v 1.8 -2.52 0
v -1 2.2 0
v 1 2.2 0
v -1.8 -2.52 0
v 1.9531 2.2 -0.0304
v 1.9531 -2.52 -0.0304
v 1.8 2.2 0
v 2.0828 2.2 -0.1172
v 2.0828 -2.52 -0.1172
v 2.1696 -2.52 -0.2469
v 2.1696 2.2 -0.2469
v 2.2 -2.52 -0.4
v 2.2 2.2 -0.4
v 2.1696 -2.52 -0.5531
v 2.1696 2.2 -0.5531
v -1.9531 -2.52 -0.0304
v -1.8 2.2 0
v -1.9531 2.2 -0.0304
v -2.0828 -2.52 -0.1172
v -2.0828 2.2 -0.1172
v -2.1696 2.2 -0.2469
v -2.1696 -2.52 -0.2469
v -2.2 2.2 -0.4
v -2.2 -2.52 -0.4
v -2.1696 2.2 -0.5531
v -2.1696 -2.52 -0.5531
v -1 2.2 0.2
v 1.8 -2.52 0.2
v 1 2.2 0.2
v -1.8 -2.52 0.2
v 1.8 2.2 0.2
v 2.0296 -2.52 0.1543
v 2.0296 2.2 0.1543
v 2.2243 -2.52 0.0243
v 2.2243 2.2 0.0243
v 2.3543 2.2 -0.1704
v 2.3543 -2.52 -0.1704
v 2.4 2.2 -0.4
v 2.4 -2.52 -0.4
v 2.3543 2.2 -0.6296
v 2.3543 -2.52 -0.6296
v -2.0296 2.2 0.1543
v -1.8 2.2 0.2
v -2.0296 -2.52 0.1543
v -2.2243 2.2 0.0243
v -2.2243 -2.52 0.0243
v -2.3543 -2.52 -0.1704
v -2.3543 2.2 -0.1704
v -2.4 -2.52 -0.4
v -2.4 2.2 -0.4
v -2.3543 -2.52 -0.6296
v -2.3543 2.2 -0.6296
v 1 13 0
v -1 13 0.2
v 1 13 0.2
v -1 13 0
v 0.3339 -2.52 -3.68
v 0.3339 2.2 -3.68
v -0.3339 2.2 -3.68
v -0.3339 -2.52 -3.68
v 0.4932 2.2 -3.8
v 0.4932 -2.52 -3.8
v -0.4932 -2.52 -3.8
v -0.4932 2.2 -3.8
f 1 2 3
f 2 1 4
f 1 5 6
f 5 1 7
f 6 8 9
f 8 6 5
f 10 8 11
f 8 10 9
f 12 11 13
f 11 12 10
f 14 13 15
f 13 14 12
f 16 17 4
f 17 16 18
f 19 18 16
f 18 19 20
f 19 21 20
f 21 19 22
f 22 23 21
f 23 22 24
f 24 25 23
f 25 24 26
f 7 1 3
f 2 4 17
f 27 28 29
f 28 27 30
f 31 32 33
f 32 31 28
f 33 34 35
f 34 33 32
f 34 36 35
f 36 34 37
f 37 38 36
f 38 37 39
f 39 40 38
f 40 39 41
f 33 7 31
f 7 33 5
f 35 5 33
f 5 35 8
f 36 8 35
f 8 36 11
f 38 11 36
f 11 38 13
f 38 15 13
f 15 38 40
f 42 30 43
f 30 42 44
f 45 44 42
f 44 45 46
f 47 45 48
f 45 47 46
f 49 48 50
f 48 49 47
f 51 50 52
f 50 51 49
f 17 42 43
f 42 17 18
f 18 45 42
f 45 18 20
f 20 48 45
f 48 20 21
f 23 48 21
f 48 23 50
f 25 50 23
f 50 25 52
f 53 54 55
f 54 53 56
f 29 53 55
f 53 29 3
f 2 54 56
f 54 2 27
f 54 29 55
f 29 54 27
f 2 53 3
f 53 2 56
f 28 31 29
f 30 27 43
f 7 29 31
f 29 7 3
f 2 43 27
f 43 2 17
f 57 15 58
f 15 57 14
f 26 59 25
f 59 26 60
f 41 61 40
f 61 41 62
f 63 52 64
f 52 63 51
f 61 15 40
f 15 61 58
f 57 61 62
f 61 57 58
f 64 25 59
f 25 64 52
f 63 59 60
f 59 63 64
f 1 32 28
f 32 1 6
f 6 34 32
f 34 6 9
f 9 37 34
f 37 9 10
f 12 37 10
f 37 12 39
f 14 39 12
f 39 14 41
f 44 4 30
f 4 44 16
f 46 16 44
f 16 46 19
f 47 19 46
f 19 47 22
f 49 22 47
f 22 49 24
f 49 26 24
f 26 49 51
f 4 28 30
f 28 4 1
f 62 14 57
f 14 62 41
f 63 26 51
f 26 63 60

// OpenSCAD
// file: ../p/box5-2p.scad
use <../lib.scad>
function ldraw_lib__box5_2p() = [
// 0 Box with  5 Faces without  2 Parallel Edges
// 0 Name: box5-2p.dat
// 0 Author: Willy Tschager [Holly-Wood]
// 0 !LDRAW_ORG Primitive UPDATE 2024-01
// 0 !LICENSE Licensed under CC BY 4.0 : see CAreadme.txt
// 
// 0 BFC CERTIFY CCW
  [0,"BFC","CERTIFY"],
  [0,"BFC","CCW"],
// 
// 0 !HISTORY 2012-03-30 [PTadmin] Official Update 2012-01
// 0 !HISTORY 2024-01-04 [Holly-Wood] Complete re-write, original by Brickaneer
// 0 !HISTORY 2024-01-29 [OrionP] Official Update 2024-01
// 
// 2 24 -1 1 1 1 1 1
  [2,24,-1,1,1,1,1,1],
// 2 24 -1 1 -1 -1 1 1
  [2,24,-1,1,-1,-1,1,1],
// 2 24 1 1 -1 -1 1 -1
  [2,24,1,1,-1,-1,1,-1],
// 2 24 1 1 1 1 1 -1
  [2,24,1,1,1,1,1,-1],
// 4 16 1 1 1 1 1 -1 -1 1 -1 -1 1 1
  [4,16,1,1,1,1,1,-1,-1,1,-1,-1,1,1],
// 
// 2 24 -1 1 1 -1 0 1
  [2,24,-1,1,1,-1,0,1],
// 2 24 -1 1 -1 -1 0 -1
  [2,24,-1,1,-1,-1,0,-1],
// 2 24 -1 0 -1 -1 0 1
  [2,24,-1,0,-1,-1,0,1],
// 4 16 -1 1 1 -1 1 -1 -1 0 -1 -1 0 1
  [4,16,-1,1,1,-1,1,-1,-1,0,-1,-1,0,1],
// 
// 2 24 1 1 1 1 0 1
  [2,24,1,1,1,1,0,1],
// 2 24 1 1 -1 1 0 -1
  [2,24,1,1,-1,1,0,-1],
// 2 24 1 0 1 1 0 -1
  [2,24,1,0,1,1,0,-1],
// 4 16 1 1 -1 1 1 1 1 0 1 1 0 -1
  [4,16,1,1,-1,1,1,1,1,0,1,1,0,-1],
// 
// 4 16 1 1 1 -1 1 1 -1 0 1 1 0 1
  [4,16,1,1,1,-1,1,1,-1,0,1,1,0,1],
// 4 16 -1 1 -1 1 1 -1 1 0 -1 -1 0 -1
  [4,16,-1,1,-1,1,1,-1,1,0,-1,-1,0,-1],
];
module ldraw_lib__box5_2p(step=0, col=false, unit=2/5, alt=false, line=0.2, solid=!$preview)
    makepoly(ldraw_lib__box5_2p(), step=step, col=col, unit=unit, alt=alt, line=line, solid=solid);
ldraw_lib__box5_2p(line=0.2);
// file: ../p/5-16cyli.scad
use <../lib.scad>
function ldraw_lib__5_16cyli() = [
// 0 Cylinder 0.3125
// 0 Name: 5-16cyli.dat
// 0 Author: Philippe Hurbain [Philo]
// 0 !LDRAW_ORG Primitive UPDATE 2009-03
// 0 !LICENSE Licensed under CC BY 4.0 : see CAreadme.txt
// 
// 0 BFC CERTIFY CCW
  [0,"BFC","CERTIFY"],
  [0,"BFC","CCW"],
// 
// 0 !HISTORY 2009-12-29 [PTadmin] Official Update 2009-03
// 
// 
// 4 16 0.9239 0 0.3827 1 0 0 1 1 0 0.9239 1 0.3827
  [4,16,0.9239,0,0.3827,1,0,0,1,1,0,0.9239,1,0.3827],
// 4 16 0.7071 0 0.7071 0.9239 0 0.3827 0.9239 1 0.3827 0.7071 1 0.7071
  [4,16,0.7071,0,0.7071,0.9239,0,0.3827,0.9239,1,0.3827,0.7071,1,0.7071],
// 4 16 0.3827 0 0.9239 0.7071 0 0.7071 0.7071 1 0.7071 0.3827 1 0.9239
  [4,16,0.3827,0,0.9239,0.7071,0,0.7071,0.7071,1,0.7071,0.3827,1,0.9239],
// 4 16 0 0 1 0.3827 0 0.9239 0.3827 1 0.9239 0 1 1
  [4,16,0,0,1,0.3827,0,0.9239,0.3827,1,0.9239,0,1,1],
// 4 16 -0.3827 0 0.9239 0 0 1 0 1 1 -0.3827 1 0.9239
  [4,16,-0.3827,0,0.9239,0,0,1,0,1,1,-0.3827,1,0.9239],
// 
// 0 // conditional lines
// 5 24 1 1 0 1 0 0 1 1 -0.4142 0.9239 1 0.3827
  [5,24,1,1,0,1,0,0,1,1,-0.4142,0.9239,1,0.3827],
// 5 24 0.9239 1 0.3827 0.9239 0 0.3827 1 1 0 0.7071 1 0.7071
  [5,24,0.9239,1,0.3827,0.9239,0,0.3827,1,1,0,0.7071,1,0.7071],
// 5 24 0.7071 1 0.7071 0.7071 0 0.7071 0.9239 1 0.3827 0.3827 1 0.9239
  [5,24,0.7071,1,0.7071,0.7071,0,0.7071,0.9239,1,0.3827,0.3827,1,0.9239],
// 5 24 0.3827 1 0.9239 0.3827 0 0.9239 0.7071 1 0.7071 0 1 1
  [5,24,0.3827,1,0.9239,0.3827,0,0.9239,0.7071,1,0.7071,0,1,1],
// 5 24 0 1 1 0 0 1 0.3827 1 0.9239 -0.3827 1 0.9239
  [5,24,0,1,1,0,0,1,0.3827,1,0.9239,-0.3827,1,0.9239],
// 5 24 -0.3827 1 0.9239 -0.3827 0 0.9239 0 1 1 -0.7654 1 0.7654
  [5,24,-0.3827,1,0.9239,-0.3827,0,0.9239,0,1,1,-0.7654,1,0.7654],
// 
// 0 // end of file
// 
];
module ldraw_lib__5_16cyli(step=0, col=false, unit=2/5, alt=false, line=0.2, solid=!$preview)
    makepoly(ldraw_lib__5_16cyli(), step=step, col=col, unit=unit, alt=alt, line=line, solid=solid);
ldraw_lib__5_16cyli(line=0.2);
// file: s/u9654s01.scad
use <../../lib.scad>
use <../../p/5-16cyli.scad>
use <../../p/5-16edge.scad>
use <../../p/5-16ring2.scad>
use <../../p/box5-2p.scad>
use <../../p/rect2p.scad>
function ldraw_lib__s__u9654s01() = [
// 0 ~Electric Switch: Plug Common Shape
// 0 Name: s\u9654s01.dat
// 0 Author: Javier Orquera [kuramapika1]
// 0 !LDRAW_ORG Subpart UPDATE 2026-07
// 0 !LICENSE Licensed under CC BY 4.0 : see CAreadme.txt
// 
// 0 BFC CERTIFY CCW
  [0,"BFC","CERTIFY"],
  [0,"BFC","CCW"],
// 
// 0 !HISTORY 2025-04-24 [kuramapika1] Changed some vertex positions to fit the shape of parent parts
// 0 !HISTORY 2026-07-30 [OrionP] Official Update 2026-07
// 
// 4 16 -2.5 0 5.5 2.5 0 5.5 4.5 0 -6.3 -4.5 0 -6.3
  [4,16,-2.5,0,5.5,2.5,0,5.5,4.5,0,-6.3,-4.5,0,-6.3],
// 0 BFC INVERTNEXT
  [0,"BFC","INVERTNEXT"],
// 1 16 4.5 1 -6.3 0 0 1 -1 0 0 0 11.8 0 5-16cyli.dat
  [1,16,4.5,1,-6.3,0,0,1,-1,0,0,0,11.8,0, ldraw_lib__5_16cyli()],
// 1 16 4.5 1 5.5 0 0 1 -1 0 0 0 1 0 5-16edge.dat
  [1,16,4.5,1,5.5,0,0,1,-1,0,0,0,1,0, ldraw_lib__5_16edge()],
// 0 BFC INVERTNEXT
  [0,"BFC","INVERTNEXT"],
// 1 16 -4.5 1 -6.3 0 0 -1 -1 0 0 0 11.8 0 5-16cyli.dat
  [1,16,-4.5,1,-6.3,0,0,-1,-1,0,0,0,11.8,0, ldraw_lib__5_16cyli()],
// 1 16 -4.5 1 5.5 0 0 -1 -1 0 0 0 1 0 5-16edge.dat
  [1,16,-4.5,1,5.5,0,0,-1,-1,0,0,0,1,0, ldraw_lib__5_16edge()],
// 3 16 4.5 0 5.5 4.5 0 -6.3 2.5 0 5.5
  [3,16,4.5,0,5.5,4.5,0,-6.3,2.5,0,5.5],
// 3 16 -2.5 0 5.5 -4.5 0 -6.3 -4.5 0 5.5
  [3,16,-2.5,0,5.5,-4.5,0,-6.3,-4.5,0,5.5],
// 4 16 2.5 -.5 5.5 -2.5 -.5 5.5 -4.5 -.5 -6.3 4.5 -.5 -6.3
  [4,16,2.5,-.5,5.5,-2.5,-.5,5.5,-4.5,-.5,-6.3,4.5,-.5,-6.3],
// 1 16 4.5 1 -6.3 0 0 1.5 -1.5 0 0 0 11.8 0 5-16cyli.dat
  [1,16,4.5,1,-6.3,0,0,1.5,-1.5,0,0,0,11.8,0, ldraw_lib__5_16cyli()],
// 1 16 4.5 1 5.5 0 0 1.5 -1.5 0 0 0 1 0 5-16edge.dat
  [1,16,4.5,1,5.5,0,0,1.5,-1.5,0,0,0,1,0, ldraw_lib__5_16edge()],
// 1 16 4.5 1 5.5 0 0 .5 -.5 0 0 0 -1 0 5-16ring2.dat
  [1,16,4.5,1,5.5,0,0,.5,-.5,0,0,0,-1,0, ldraw_lib__5_16ring2()],
// 1 16 -4.5 1 -6.3 0 0 -1.5 -1.5 0 0 0 11.8 0 5-16cyli.dat
  [1,16,-4.5,1,-6.3,0,0,-1.5,-1.5,0,0,0,11.8,0, ldraw_lib__5_16cyli()],
// 1 16 -4.5 1 5.5 0 0 -1.5 -1.5 0 0 0 1 0 5-16edge.dat
  [1,16,-4.5,1,5.5,0,0,-1.5,-1.5,0,0,0,1,0, ldraw_lib__5_16edge()],
// 1 16 -4.5 1 5.5 0 0 -.5 -.5 0 0 0 -1 0 5-16ring2.dat
  [1,16,-4.5,1,5.5,0,0,-.5,-.5,0,0,0,-1,0, ldraw_lib__5_16ring2()],
// 1 16 0 -0.25 5.5 -2.5 0 0 0 0 -0.25 0 27 0 box5-2p.dat
  [1,16,0,-0.25,5.5,-2.5,0,0,0,0,-0.25,0,27,0, ldraw_lib__box5_2p()],
// 3 16 4.5 -.5 -6.3 4.5 -.5 5.5 2.5 -.5 5.5
  [3,16,4.5,-.5,-6.3,4.5,-.5,5.5,2.5,-.5,5.5],
// 3 16 -4.5 -.5 -6.3 -2.5 -.5 5.5 -4.5 -.5 5.5
  [3,16,-4.5,-.5,-6.3,-2.5,-.5,5.5,-4.5,-.5,5.5],
// 1 16 3.5 -.25 5.5 -1 0 0 0 0 -.25 0 -1 0 rect2p.dat
  [1,16,3.5,-.25,5.5,-1,0,0,0,0,-.25,0,-1,0, ldraw_lib__rect2p()],
// 1 16 -3.5 -.25 5.5 -1 0 0 0 0 -.25 0 -1 0 rect2p.dat
  [1,16,-3.5,-.25,5.5,-1,0,0,0,0,-.25,0,-1,0, ldraw_lib__rect2p()],
// 4 16 .83485 9.2 -6.3 5.4239 1.3827 -6.3 5.4239 1.3827 5.5 .83485 9.2 5.5
  [4,16,.83485,9.2,-6.3,5.4239,1.3827,-6.3,5.4239,1.3827,5.5,.83485,9.2,5.5],
// 4 16 -.83485 9.2 5.5 -5.4239 1.3827 5.5 -5.4239 1.3827 -6.3 -.83485 9.2 -6.3
  [4,16,-.83485,9.2,5.5,-5.4239,1.3827,5.5,-5.4239,1.3827,-6.3,-.83485,9.2,-6.3],
// 4 16 5.88585 1.57405 5.5 5.88585 1.57405 -6.3 1.23302 9.5 -6.3 1.23302 9.5 5.5
  [4,16,5.88585,1.57405,5.5,5.88585,1.57405,-6.3,1.23302,9.5,-6.3,1.23302,9.5,5.5],
// 4 16 -5.88585 1.57405 -6.3 -5.88585 1.57405 5.5 -1.23302 9.5 5.5 -1.23302 9.5 -6.3
  [4,16,-5.88585,1.57405,-6.3,-5.88585,1.57405,5.5,-1.23302,9.5,5.5,-1.23302,9.5,-6.3],
// 4 16 5.4239 1.3827 5.5 5.88585 1.57405 5.5 1.23302 9.5 5.5 .83485 9.2 5.5
  [4,16,5.4239,1.3827,5.5,5.88585,1.57405,5.5,1.23302,9.5,5.5,.83485,9.2,5.5],
// 4 16 .83485 9.2 5.5 1.23302 9.5 5.5 1.23302 9.5 -6.3 .83485 9.2 -6.3
  [4,16,.83485,9.2,5.5,1.23302,9.5,5.5,1.23302,9.5,-6.3,.83485,9.2,-6.3],
// 4 16 -.83485 9.2 5.5 -1.23302 9.5 5.5 -5.88585 1.57405 5.5 -5.4239 1.3827 5.5
  [4,16,-.83485,9.2,5.5,-1.23302,9.5,5.5,-5.88585,1.57405,5.5,-5.4239,1.3827,5.5],
// 4 16 -.83485 9.2 -6.3 -1.23302 9.5 -6.3 -1.23302 9.5 5.5 -.83485 9.2 5.5
  [4,16,-.83485,9.2,-6.3,-1.23302,9.5,-6.3,-1.23302,9.5,5.5,-.83485,9.2,5.5],
// 2 24 1.23302 9.5 5.5 .83485 9.2 5.5
  [2,24,1.23302,9.5,5.5,.83485,9.2,5.5],
// 2 24 -.83485 9.2 -6.3 -.83485 9.2 5.5
  [2,24,-.83485,9.2,-6.3,-.83485,9.2,5.5],
// 2 24 -.83485 9.2 5.5 -1.23302 9.5 5.5
  [2,24,-.83485,9.2,5.5,-1.23302,9.5,5.5],
// 2 24 1.23302 9.5 -6.3 1.23302 9.5 5.5
  [2,24,1.23302,9.5,-6.3,1.23302,9.5,5.5],
// 2 24 1.23302 9.5 5.5 5.88585 1.57405 5.5
  [2,24,1.23302,9.5,5.5,5.88585,1.57405,5.5],
// 2 24 -5.88585 1.57405 5.5 -1.23302 9.5 5.5
  [2,24,-5.88585,1.57405,5.5,-1.23302,9.5,5.5],
// 2 24 5.4239 1.3827 5.5 .83485 9.2 5.5
  [2,24,5.4239,1.3827,5.5,.83485,9.2,5.5],
// 2 24 -1.23302 9.5 5.5 -1.23302 9.5 -6.3
  [2,24,-1.23302,9.5,5.5,-1.23302,9.5,-6.3],
// 2 24 -.83485 9.2 5.5 -5.4239 1.3827 5.5
  [2,24,-.83485,9.2,5.5,-5.4239,1.3827,5.5],
// 2 24 .83485 9.2 5.5 .83485 9.2 -6.3
  [2,24,.83485,9.2,5.5,.83485,9.2,-6.3],
];
module ldraw_lib__s__u9654s01(step=0, col=false, unit=2/5, alt=false, line=0.2, solid=!$preview)
    makepoly(ldraw_lib__s__u9654s01(), step=step, col=col, unit=unit, alt=alt, line=line, solid=solid);
ldraw_lib__s__u9654s01(line=0.2);
// file: ../p/rect2p.scad
use <../lib.scad>
function ldraw_lib__rect2p() = [
// 0 Rectangle with 2 Parallel Edges
// 0 Name: rect2p.dat
// 0 Author: Donald Sutter [technog]
// 0 !LDRAW_ORG Primitive UPDATE 2010-01
// 0 !LICENSE Licensed under CC BY 4.0 : see CAreadme.txt
// 
// 0 BFC CERTIFY CCW
  [0,"BFC","CERTIFY"],
  [0,"BFC","CCW"],
// 
// 0 !HISTORY 2003-08-01 [PTadmin] Official Update 2003-02
// 0 !HISTORY 2007-06-24 [PTadmin] Header formatted for Contributor Agreement
// 0 !HISTORY 2008-07-01 [PTadmin] Official Update 2008-01
// 0 !HISTORY 2010-01-17 [mikeheide] changed winding to CCW
// 0 !HISTORY 2010-04-05 [PTadmin] Official Update 2010-01
// 
// 
// 2 24 1 0 1 -1 0 1
  [2,24,1,0,1,-1,0,1],
// 2 24 -1 0 -1 1 0 -1
  [2,24,-1,0,-1,1,0,-1],
// 4 16 -1 0 1 -1 0 -1 1 0 -1 1 0 1
  [4,16,-1,0,1,-1,0,-1,1,0,-1,1,0,1],
// 0
];
module ldraw_lib__rect2p(step=0, col=false, unit=2/5, alt=false, line=0.2, solid=!$preview)
    makepoly(ldraw_lib__rect2p(), step=step, col=col, unit=unit, alt=alt, line=line, solid=solid);
ldraw_lib__rect2p(line=0.2);
// file: ../p/5-16ring2.scad
use <../lib.scad>
function ldraw_lib__5_16ring2() = [
// 0 Ring  2 x 0.3125
// 0 Name: 5-16ring2.dat
// 0 Author: Alex Taylor [anathema]
// 0 !LDRAW_ORG Primitive UPDATE 2024-02
// 0 !LICENSE Licensed under CC BY 4.0 : see CAreadme.txt
// 
// 0 BFC CERTIFY CCW
  [0,"BFC","CERTIFY"],
  [0,"BFC","CCW"],
// 
// 0 !HISTORY 2011-07-25 [PTadmin] Official Update 2011-01
// 0 !HISTORY 2024-03-23 [OrionP] Moved from 5-16rin2.dat
// 0 !HISTORY 2024-03-24 [OrionP] Official Update 2024-02
// 
// 4 16 2 0 0 3 0 0 2.7717 0 1.1481 1.8478 0 0.7654
  [4,16,2,0,0,3,0,0,2.7717,0,1.1481,1.8478,0,0.7654],
// 4 16 1.8478 0 0.7654 2.7717 0 1.1481 2.1213 0 2.1213 1.4142 0 1.4142
  [4,16,1.8478,0,0.7654,2.7717,0,1.1481,2.1213,0,2.1213,1.4142,0,1.4142],
// 4 16 1.4142 0 1.4142 2.1213 0 2.1213 1.1481 0 2.7717 0.7654 0 1.8478
  [4,16,1.4142,0,1.4142,2.1213,0,2.1213,1.1481,0,2.7717,0.7654,0,1.8478],
// 4 16 0.7654 0 1.8478 1.1481 0 2.7717 0 0 3 0 0 2
  [4,16,0.7654,0,1.8478,1.1481,0,2.7717,0,0,3,0,0,2],
// 4 16 0 0 2 0 0 3 -1.1481 0 2.7717 -0.7654 0 1.8478
  [4,16,0,0,2,0,0,3,-1.1481,0,2.7717,-0.7654,0,1.8478],
// 0
];
module ldraw_lib__5_16ring2(step=0, col=false, unit=2/5, alt=false, line=0.2, solid=!$preview)
    makepoly(ldraw_lib__5_16ring2(), step=step, col=col, unit=unit, alt=alt, line=line, solid=solid);
ldraw_lib__5_16ring2(line=0.2);
// file: ../p/5-16edge.scad
use <../lib.scad>
function ldraw_lib__5_16edge() = [
// 0 Circle 0.3125
// 0 Name: 5-16edge.dat
// 0 Author: Philippe Hurbain [Philo]
// 0 !LDRAW_ORG Primitive UPDATE 2009-03
// 0 !LICENSE Licensed under CC BY 4.0 : see CAreadme.txt
// 
// 0 BFC CERTIFY CCW
  [0,"BFC","CERTIFY"],
  [0,"BFC","CCW"],
// 
// 0 !HISTORY 2009-12-29 [PTadmin] Official Update 2009-03
// 
// 
// 2 24 1 0 0 0.9239 0 0.3827
  [2,24,1,0,0,0.9239,0,0.3827],
// 2 24 0.9239 0 0.3827 0.7071 0 0.7071
  [2,24,0.9239,0,0.3827,0.7071,0,0.7071],
// 2 24 0.7071 0 0.7071 0.3827 0 0.9239
  [2,24,0.7071,0,0.7071,0.3827,0,0.9239],
// 2 24 0.3827 0 0.9239 0 0 1
  [2,24,0.3827,0,0.9239,0,0,1],
// 2 24 0 0 1 -0.3827 0 0.9239
  [2,24,0,0,1,-0.3827,0,0.9239],
// 
// 0 // end of file
// 
];
module ldraw_lib__5_16edge(step=0, col=false, unit=2/5, alt=false, line=0.2, solid=!$preview)
    makepoly(ldraw_lib__5_16edge(), step=step, col=col, unit=unit, alt=alt, line=line, solid=solid);
ldraw_lib__5_16edge(line=0.2);
// main file
use <../lib.scad>
use <../p/5-16edge.scad>
use <../p/5-16ring2.scad>
use <../p/rect2p.scad>
use <s/u9654s01.scad>
function ldraw_lib__u9654() = [
// 0 ~Electric Switch: Female Plug
// 0 Name: u9654.dat
// 0 Author: Javier Orquera [kuramapika1]
// 0 !LDRAW_ORG Part UPDATE 2026-07
// 0 !LICENSE Licensed under CC BY 4.0 : see CAreadme.txt
// 
// 0 !HELP To be used in 4707 assemblies parts
// 
// 0 BFC CERTIFY CCW
  [0,"BFC","CERTIFY"],
  [0,"BFC","CCW"],
// 
// 0 !CATEGORY Electric
// 
// 0 !HISTORY 2026-07-30 [OrionP] Official Update 2026-07
// 
// 1 16 0 0 0 1 0 0 0 1 0 0 0 1 s\u9654s01.dat
  [1,16,0,0,0,1,0,0,0,1,0,0,0,1, ldraw_lib__s__u9654s01()],
// 1 16 4.5 1 -6.3 0 0 .5 -.5 0 0 0 1 0 5-16ring2.dat
  [1,16,4.5,1,-6.3,0,0,.5,-.5,0,0,0,1,0, ldraw_lib__5_16ring2()],
// 1 16 -4.5 1 -6.3 0 0 -.5 -.5 0 0 0 1 0 5-16ring2.dat
  [1,16,-4.5,1,-6.3,0,0,-.5,-.5,0,0,0,1,0, ldraw_lib__5_16ring2()],
// 1 16 4.5 1 -6.3 0 0 1 -1 0 0 0 1 0 5-16edge.dat
  [1,16,4.5,1,-6.3,0,0,1,-1,0,0,0,1,0, ldraw_lib__5_16edge()],
// 1 16 -4.5 1 -6.3 0 0 -1 -1 0 0 0 1 0 5-16edge.dat
  [1,16,-4.5,1,-6.3,0,0,-1,-1,0,0,0,1,0, ldraw_lib__5_16edge()],
// 1 16 4.5 1 -6.3 0 0 1.5 -1.5 0 0 0 1 0 5-16edge.dat
  [1,16,4.5,1,-6.3,0,0,1.5,-1.5,0,0,0,1,0, ldraw_lib__5_16edge()],
// 1 16 -4.5 1 -6.3 0 0 -1.5 -1.5 0 0 0 1 0 5-16edge.dat
  [1,16,-4.5,1,-6.3,0,0,-1.5,-1.5,0,0,0,1,0, ldraw_lib__5_16edge()],
// 1 16 0 -.25 -6.3 -4.5 0 0 0 0 .25 0 1 0 rect2p.dat
  [1,16,0,-.25,-6.3,-4.5,0,0,0,0,.25,0,1,0, ldraw_lib__rect2p()],
// 4 16 .83485 9.2 -6.3 1.23302 9.5 -6.3 5.88585 1.57405 -6.3 5.4239 1.3827 -6.3
  [4,16,.83485,9.2,-6.3,1.23302,9.5,-6.3,5.88585,1.57405,-6.3,5.4239,1.3827,-6.3],
// 4 16 -5.4239 1.3827 -6.3 -5.88585 1.57405 -6.3 -1.23302 9.5 -6.3 -.83485 9.2 -6.3
  [4,16,-5.4239,1.3827,-6.3,-5.88585,1.57405,-6.3,-1.23302,9.5,-6.3,-.83485,9.2,-6.3],
// 2 24 -1.23302 9.5 -6.3 -5.88585 1.57405 -6.3
  [2,24,-1.23302,9.5,-6.3,-5.88585,1.57405,-6.3],
// 2 24 -5.4239 1.3827 -6.3 -.83485 9.2 -6.3
  [2,24,-5.4239,1.3827,-6.3,-.83485,9.2,-6.3],
// 2 24 .83485 9.2 -6.3 5.4239 1.3827 -6.3
  [2,24,.83485,9.2,-6.3,5.4239,1.3827,-6.3],
// 2 24 -.83485 9.2 -6.3 -1.23302 9.5 -6.3
  [2,24,-.83485,9.2,-6.3,-1.23302,9.5,-6.3],
// 2 24 5.88585 1.57405 -6.3 1.23302 9.5 -6.3
  [2,24,5.88585,1.57405,-6.3,1.23302,9.5,-6.3],
// 2 24 1.23302 9.5 -6.3 .83485 9.2 -6.3
  [2,24,1.23302,9.5,-6.3,.83485,9.2,-6.3],
];
module ldraw_lib__u9654(step=0, col=false, unit=2/5, alt=false, line=0.2, solid=!$preview)
    makepoly(ldraw_lib__u9654(), step=step, col=col, unit=unit, alt=alt, line=line, solid=solid);
ldraw_lib__u9654(line=0.2);
